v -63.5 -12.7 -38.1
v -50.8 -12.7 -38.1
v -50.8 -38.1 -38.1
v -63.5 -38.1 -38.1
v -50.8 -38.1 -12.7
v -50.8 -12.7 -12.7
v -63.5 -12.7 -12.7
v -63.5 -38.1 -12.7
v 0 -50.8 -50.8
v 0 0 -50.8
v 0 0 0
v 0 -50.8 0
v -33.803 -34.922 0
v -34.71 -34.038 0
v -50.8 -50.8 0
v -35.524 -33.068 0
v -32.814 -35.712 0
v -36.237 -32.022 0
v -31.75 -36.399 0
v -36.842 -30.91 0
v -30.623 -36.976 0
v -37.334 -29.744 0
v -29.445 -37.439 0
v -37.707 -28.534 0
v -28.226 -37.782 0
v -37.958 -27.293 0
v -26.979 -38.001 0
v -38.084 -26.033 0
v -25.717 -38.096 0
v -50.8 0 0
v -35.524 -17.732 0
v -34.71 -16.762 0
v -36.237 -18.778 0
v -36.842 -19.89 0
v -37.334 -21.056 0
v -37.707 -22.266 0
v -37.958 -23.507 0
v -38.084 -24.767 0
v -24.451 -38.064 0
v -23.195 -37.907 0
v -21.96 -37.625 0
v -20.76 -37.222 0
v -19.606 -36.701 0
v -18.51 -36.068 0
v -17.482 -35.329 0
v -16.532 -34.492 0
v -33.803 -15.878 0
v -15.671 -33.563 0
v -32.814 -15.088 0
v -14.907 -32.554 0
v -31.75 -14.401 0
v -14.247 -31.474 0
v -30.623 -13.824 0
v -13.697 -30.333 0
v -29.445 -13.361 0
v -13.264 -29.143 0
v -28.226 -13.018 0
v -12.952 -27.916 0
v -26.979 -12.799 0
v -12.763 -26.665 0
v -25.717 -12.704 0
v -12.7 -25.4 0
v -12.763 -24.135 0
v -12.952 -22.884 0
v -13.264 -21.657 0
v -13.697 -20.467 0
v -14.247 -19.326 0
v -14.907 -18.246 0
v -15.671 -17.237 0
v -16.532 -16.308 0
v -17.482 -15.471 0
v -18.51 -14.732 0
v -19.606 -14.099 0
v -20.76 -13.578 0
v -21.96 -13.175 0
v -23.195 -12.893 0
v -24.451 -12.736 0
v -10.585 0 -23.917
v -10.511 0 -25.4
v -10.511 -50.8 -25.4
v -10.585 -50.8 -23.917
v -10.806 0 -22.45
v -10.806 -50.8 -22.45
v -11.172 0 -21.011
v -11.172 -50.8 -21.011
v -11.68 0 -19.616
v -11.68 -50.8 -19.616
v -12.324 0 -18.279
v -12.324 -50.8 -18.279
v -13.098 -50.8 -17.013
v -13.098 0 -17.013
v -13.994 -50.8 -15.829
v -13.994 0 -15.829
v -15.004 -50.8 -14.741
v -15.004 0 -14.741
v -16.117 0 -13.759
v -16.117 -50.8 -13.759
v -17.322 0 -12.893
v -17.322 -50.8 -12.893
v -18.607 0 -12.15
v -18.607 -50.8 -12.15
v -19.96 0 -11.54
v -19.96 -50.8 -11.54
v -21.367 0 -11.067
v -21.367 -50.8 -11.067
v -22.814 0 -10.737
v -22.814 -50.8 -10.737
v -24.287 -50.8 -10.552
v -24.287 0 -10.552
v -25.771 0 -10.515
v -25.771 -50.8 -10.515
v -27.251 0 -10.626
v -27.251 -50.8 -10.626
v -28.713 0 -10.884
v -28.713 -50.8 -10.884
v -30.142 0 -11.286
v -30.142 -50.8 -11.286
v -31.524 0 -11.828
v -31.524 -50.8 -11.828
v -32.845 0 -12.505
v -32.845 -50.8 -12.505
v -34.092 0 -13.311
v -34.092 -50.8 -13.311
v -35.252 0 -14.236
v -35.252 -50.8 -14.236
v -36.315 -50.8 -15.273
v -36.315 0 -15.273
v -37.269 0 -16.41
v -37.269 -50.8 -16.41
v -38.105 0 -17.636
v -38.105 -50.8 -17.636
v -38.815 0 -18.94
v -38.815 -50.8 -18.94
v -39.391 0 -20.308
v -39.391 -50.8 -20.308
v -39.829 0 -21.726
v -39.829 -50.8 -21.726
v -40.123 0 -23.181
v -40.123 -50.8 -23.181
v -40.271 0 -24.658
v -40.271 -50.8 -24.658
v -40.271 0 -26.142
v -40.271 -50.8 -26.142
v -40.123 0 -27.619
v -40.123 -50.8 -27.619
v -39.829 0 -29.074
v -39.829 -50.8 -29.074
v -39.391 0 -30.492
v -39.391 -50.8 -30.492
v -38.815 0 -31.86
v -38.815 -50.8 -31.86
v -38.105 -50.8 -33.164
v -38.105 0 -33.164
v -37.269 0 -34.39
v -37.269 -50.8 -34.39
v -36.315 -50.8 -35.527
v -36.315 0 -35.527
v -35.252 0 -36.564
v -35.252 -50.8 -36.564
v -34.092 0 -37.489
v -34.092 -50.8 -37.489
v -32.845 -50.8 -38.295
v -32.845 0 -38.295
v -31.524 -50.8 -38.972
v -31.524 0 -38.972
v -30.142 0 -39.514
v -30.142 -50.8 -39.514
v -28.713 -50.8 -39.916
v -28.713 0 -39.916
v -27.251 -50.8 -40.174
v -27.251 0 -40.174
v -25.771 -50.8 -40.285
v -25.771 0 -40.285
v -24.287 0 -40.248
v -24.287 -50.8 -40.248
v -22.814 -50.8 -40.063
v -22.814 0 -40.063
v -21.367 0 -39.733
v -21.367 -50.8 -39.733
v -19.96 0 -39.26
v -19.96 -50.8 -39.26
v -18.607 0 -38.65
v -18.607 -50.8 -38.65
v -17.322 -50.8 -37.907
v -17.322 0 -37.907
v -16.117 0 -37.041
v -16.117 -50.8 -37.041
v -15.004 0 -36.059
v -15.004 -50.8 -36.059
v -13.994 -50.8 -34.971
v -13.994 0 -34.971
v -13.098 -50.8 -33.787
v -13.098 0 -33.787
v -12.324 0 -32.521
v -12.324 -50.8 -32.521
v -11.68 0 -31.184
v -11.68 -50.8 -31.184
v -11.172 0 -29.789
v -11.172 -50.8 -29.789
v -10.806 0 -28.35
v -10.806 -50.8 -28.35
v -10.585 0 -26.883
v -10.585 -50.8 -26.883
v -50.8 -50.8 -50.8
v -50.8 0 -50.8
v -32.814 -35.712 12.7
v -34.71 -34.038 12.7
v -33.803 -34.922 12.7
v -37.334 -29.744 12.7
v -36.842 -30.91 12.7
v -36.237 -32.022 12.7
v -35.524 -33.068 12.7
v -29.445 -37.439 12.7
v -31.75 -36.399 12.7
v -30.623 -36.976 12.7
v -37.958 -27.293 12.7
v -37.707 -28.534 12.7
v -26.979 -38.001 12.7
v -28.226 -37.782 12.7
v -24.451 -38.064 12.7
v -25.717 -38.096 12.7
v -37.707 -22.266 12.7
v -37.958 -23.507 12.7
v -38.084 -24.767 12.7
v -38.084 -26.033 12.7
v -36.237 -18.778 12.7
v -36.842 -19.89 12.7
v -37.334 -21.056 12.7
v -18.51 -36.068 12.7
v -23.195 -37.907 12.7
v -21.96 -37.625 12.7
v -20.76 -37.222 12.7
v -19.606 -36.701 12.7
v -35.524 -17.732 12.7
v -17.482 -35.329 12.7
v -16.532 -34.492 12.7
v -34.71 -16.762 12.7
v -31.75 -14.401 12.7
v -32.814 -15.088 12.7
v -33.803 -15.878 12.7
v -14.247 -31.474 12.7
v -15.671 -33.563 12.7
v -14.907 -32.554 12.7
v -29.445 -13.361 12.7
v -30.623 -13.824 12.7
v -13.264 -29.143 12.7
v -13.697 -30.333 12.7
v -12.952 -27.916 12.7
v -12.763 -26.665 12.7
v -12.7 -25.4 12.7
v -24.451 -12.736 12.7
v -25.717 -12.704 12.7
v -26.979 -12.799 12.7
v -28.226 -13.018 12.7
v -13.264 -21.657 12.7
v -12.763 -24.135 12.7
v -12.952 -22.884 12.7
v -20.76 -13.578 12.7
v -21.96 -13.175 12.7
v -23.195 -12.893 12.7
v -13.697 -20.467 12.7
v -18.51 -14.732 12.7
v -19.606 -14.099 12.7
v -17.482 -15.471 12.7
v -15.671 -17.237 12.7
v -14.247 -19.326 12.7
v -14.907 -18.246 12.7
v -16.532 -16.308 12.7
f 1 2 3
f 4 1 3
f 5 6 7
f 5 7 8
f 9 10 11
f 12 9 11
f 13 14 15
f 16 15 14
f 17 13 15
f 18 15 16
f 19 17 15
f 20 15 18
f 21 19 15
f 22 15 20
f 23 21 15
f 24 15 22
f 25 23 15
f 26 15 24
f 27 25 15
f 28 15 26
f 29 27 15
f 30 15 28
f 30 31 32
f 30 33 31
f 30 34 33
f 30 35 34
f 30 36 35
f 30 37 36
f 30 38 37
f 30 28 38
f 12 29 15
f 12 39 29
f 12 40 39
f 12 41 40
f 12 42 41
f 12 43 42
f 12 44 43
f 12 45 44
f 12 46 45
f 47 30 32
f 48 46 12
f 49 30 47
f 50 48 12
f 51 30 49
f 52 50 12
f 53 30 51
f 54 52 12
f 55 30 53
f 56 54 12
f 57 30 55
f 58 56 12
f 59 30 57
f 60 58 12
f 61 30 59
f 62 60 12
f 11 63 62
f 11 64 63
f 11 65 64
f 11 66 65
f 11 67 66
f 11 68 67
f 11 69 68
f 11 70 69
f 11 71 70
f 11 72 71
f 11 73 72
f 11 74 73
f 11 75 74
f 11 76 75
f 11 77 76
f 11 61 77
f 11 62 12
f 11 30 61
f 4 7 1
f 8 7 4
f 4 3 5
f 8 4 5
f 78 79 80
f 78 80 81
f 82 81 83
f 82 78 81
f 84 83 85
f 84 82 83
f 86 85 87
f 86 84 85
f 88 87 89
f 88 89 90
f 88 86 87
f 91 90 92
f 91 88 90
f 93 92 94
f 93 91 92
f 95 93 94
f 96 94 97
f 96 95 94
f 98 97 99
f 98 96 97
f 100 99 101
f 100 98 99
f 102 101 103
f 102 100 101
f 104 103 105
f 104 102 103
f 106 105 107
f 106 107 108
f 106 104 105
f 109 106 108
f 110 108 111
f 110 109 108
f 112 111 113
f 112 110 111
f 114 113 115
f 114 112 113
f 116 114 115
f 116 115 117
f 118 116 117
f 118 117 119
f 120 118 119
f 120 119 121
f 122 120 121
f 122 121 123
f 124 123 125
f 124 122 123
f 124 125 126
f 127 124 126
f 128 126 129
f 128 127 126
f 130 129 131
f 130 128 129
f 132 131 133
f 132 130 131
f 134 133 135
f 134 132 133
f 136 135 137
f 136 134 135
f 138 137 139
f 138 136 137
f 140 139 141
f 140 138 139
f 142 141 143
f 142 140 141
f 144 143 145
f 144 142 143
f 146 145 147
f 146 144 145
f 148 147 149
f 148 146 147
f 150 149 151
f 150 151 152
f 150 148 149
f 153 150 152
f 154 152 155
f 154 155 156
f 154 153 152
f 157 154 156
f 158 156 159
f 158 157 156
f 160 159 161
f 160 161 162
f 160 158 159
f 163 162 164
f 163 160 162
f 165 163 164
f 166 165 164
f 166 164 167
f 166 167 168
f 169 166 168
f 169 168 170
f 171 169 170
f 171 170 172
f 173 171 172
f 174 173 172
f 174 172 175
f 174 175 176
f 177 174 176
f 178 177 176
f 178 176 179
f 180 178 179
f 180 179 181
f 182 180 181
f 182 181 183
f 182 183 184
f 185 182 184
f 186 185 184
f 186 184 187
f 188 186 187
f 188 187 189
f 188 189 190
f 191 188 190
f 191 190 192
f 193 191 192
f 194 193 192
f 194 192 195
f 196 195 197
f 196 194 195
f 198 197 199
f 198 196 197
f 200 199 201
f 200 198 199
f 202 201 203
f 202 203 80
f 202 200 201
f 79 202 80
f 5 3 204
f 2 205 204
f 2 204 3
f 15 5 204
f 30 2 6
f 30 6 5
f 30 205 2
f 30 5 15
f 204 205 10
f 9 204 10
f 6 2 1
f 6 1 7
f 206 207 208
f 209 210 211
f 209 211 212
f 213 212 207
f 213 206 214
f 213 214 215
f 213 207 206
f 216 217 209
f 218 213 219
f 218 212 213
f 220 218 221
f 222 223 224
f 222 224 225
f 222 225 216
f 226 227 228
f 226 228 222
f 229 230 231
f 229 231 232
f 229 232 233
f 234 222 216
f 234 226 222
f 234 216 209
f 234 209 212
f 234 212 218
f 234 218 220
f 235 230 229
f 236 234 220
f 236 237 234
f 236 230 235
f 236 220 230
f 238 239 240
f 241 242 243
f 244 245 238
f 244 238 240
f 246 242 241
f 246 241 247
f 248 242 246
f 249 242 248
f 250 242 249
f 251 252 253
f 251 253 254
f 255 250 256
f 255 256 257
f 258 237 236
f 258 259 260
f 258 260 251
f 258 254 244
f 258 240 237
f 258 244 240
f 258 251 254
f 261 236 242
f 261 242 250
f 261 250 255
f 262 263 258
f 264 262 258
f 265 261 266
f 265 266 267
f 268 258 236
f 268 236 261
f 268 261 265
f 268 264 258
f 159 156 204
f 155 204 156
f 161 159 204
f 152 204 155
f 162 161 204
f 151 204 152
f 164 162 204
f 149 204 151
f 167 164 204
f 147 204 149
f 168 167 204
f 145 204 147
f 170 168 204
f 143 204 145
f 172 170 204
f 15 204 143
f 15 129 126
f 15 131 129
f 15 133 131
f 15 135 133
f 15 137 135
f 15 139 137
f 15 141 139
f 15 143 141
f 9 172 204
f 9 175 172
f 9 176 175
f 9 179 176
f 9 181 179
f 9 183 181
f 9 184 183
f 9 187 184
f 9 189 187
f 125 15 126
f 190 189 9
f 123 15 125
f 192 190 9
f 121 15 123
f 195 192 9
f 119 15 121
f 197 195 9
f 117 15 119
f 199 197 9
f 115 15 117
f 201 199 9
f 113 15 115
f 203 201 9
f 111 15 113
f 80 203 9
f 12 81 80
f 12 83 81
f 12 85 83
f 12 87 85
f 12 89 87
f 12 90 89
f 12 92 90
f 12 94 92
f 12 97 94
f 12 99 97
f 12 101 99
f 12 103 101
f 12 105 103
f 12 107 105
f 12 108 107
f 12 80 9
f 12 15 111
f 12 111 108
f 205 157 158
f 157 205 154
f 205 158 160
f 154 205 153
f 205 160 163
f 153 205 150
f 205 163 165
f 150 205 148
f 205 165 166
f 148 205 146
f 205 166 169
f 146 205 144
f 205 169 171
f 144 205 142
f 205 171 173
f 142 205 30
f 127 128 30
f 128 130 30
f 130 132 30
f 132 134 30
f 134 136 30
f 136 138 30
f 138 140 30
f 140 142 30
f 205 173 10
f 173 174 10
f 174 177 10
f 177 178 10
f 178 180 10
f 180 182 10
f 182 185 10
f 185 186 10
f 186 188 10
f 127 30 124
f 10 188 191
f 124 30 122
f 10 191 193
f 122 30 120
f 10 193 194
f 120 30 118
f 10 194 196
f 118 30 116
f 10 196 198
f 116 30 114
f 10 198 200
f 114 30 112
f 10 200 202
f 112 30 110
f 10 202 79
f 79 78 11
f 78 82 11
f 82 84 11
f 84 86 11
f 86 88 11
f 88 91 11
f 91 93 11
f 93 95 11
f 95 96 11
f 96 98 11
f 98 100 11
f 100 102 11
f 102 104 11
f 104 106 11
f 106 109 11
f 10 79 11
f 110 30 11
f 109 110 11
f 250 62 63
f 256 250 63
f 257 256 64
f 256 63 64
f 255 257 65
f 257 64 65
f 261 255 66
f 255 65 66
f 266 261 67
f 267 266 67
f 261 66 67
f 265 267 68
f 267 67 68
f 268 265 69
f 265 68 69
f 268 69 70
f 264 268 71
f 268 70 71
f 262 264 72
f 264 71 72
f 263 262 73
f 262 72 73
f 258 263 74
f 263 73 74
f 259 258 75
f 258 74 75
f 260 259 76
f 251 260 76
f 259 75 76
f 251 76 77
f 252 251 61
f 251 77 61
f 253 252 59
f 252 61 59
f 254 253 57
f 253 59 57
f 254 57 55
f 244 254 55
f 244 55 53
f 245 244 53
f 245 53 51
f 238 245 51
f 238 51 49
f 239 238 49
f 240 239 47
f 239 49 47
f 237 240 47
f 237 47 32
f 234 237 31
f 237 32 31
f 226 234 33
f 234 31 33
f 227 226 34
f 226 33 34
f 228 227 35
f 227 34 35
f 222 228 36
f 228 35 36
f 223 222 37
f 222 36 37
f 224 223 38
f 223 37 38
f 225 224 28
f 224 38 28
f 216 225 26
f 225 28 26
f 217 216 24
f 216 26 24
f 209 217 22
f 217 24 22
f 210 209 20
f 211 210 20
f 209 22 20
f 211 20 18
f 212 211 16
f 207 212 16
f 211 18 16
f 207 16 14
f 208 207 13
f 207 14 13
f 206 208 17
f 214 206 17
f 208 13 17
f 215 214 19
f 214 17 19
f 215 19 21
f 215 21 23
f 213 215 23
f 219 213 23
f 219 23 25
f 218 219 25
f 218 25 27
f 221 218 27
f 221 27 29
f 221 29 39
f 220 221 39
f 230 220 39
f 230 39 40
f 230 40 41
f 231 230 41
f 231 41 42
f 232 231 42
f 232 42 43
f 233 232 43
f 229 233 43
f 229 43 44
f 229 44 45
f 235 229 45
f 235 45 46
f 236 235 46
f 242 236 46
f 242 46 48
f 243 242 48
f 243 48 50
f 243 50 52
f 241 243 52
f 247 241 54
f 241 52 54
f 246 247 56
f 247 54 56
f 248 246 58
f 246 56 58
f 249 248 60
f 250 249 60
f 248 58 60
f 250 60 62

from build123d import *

# Parameters (mm, degrees)
F0_W     = 50.8
F0_H     = 50.8
F0_R     = 14.889402
F1_DEPTH = 50.8
F2_W     = 25.4
F2_H     = 25.4
F3_DEPTH = 12.7
F4_R     = 12.7
F5_DEPTH = 12.7


with BuildPart() as f1:
    # F0 (on Front) → F1 (new body)
    with BuildSketch(Plane.XZ):
        with Locations((-25.4, -25.4)):
            Rectangle(F0_W, F0_H)
        with Locations((-25.4, -25.4)):
            Circle(F0_R, mode=Mode.SUBTRACT)
    extrude(amount=F1_DEPTH)

    # F2 (on face) → F3 (join)
    with BuildSketch(Plane(origin=(-50.8, 0, 0), x_dir=(0, -1, 0), z_dir=(-1, 0, 0))):
        with Locations((25.4, -25.4)):
            Rectangle(F2_W, F2_H)
    extrude(amount=F3_DEPTH)

    # F4 (on face) → F5 (join)
    with BuildSketch(Plane.XY):
        with Locations((-25.4, -25.4)):
            Circle(F4_R)
    extrude(amount=F5_DEPTH)


solid = f1.part
